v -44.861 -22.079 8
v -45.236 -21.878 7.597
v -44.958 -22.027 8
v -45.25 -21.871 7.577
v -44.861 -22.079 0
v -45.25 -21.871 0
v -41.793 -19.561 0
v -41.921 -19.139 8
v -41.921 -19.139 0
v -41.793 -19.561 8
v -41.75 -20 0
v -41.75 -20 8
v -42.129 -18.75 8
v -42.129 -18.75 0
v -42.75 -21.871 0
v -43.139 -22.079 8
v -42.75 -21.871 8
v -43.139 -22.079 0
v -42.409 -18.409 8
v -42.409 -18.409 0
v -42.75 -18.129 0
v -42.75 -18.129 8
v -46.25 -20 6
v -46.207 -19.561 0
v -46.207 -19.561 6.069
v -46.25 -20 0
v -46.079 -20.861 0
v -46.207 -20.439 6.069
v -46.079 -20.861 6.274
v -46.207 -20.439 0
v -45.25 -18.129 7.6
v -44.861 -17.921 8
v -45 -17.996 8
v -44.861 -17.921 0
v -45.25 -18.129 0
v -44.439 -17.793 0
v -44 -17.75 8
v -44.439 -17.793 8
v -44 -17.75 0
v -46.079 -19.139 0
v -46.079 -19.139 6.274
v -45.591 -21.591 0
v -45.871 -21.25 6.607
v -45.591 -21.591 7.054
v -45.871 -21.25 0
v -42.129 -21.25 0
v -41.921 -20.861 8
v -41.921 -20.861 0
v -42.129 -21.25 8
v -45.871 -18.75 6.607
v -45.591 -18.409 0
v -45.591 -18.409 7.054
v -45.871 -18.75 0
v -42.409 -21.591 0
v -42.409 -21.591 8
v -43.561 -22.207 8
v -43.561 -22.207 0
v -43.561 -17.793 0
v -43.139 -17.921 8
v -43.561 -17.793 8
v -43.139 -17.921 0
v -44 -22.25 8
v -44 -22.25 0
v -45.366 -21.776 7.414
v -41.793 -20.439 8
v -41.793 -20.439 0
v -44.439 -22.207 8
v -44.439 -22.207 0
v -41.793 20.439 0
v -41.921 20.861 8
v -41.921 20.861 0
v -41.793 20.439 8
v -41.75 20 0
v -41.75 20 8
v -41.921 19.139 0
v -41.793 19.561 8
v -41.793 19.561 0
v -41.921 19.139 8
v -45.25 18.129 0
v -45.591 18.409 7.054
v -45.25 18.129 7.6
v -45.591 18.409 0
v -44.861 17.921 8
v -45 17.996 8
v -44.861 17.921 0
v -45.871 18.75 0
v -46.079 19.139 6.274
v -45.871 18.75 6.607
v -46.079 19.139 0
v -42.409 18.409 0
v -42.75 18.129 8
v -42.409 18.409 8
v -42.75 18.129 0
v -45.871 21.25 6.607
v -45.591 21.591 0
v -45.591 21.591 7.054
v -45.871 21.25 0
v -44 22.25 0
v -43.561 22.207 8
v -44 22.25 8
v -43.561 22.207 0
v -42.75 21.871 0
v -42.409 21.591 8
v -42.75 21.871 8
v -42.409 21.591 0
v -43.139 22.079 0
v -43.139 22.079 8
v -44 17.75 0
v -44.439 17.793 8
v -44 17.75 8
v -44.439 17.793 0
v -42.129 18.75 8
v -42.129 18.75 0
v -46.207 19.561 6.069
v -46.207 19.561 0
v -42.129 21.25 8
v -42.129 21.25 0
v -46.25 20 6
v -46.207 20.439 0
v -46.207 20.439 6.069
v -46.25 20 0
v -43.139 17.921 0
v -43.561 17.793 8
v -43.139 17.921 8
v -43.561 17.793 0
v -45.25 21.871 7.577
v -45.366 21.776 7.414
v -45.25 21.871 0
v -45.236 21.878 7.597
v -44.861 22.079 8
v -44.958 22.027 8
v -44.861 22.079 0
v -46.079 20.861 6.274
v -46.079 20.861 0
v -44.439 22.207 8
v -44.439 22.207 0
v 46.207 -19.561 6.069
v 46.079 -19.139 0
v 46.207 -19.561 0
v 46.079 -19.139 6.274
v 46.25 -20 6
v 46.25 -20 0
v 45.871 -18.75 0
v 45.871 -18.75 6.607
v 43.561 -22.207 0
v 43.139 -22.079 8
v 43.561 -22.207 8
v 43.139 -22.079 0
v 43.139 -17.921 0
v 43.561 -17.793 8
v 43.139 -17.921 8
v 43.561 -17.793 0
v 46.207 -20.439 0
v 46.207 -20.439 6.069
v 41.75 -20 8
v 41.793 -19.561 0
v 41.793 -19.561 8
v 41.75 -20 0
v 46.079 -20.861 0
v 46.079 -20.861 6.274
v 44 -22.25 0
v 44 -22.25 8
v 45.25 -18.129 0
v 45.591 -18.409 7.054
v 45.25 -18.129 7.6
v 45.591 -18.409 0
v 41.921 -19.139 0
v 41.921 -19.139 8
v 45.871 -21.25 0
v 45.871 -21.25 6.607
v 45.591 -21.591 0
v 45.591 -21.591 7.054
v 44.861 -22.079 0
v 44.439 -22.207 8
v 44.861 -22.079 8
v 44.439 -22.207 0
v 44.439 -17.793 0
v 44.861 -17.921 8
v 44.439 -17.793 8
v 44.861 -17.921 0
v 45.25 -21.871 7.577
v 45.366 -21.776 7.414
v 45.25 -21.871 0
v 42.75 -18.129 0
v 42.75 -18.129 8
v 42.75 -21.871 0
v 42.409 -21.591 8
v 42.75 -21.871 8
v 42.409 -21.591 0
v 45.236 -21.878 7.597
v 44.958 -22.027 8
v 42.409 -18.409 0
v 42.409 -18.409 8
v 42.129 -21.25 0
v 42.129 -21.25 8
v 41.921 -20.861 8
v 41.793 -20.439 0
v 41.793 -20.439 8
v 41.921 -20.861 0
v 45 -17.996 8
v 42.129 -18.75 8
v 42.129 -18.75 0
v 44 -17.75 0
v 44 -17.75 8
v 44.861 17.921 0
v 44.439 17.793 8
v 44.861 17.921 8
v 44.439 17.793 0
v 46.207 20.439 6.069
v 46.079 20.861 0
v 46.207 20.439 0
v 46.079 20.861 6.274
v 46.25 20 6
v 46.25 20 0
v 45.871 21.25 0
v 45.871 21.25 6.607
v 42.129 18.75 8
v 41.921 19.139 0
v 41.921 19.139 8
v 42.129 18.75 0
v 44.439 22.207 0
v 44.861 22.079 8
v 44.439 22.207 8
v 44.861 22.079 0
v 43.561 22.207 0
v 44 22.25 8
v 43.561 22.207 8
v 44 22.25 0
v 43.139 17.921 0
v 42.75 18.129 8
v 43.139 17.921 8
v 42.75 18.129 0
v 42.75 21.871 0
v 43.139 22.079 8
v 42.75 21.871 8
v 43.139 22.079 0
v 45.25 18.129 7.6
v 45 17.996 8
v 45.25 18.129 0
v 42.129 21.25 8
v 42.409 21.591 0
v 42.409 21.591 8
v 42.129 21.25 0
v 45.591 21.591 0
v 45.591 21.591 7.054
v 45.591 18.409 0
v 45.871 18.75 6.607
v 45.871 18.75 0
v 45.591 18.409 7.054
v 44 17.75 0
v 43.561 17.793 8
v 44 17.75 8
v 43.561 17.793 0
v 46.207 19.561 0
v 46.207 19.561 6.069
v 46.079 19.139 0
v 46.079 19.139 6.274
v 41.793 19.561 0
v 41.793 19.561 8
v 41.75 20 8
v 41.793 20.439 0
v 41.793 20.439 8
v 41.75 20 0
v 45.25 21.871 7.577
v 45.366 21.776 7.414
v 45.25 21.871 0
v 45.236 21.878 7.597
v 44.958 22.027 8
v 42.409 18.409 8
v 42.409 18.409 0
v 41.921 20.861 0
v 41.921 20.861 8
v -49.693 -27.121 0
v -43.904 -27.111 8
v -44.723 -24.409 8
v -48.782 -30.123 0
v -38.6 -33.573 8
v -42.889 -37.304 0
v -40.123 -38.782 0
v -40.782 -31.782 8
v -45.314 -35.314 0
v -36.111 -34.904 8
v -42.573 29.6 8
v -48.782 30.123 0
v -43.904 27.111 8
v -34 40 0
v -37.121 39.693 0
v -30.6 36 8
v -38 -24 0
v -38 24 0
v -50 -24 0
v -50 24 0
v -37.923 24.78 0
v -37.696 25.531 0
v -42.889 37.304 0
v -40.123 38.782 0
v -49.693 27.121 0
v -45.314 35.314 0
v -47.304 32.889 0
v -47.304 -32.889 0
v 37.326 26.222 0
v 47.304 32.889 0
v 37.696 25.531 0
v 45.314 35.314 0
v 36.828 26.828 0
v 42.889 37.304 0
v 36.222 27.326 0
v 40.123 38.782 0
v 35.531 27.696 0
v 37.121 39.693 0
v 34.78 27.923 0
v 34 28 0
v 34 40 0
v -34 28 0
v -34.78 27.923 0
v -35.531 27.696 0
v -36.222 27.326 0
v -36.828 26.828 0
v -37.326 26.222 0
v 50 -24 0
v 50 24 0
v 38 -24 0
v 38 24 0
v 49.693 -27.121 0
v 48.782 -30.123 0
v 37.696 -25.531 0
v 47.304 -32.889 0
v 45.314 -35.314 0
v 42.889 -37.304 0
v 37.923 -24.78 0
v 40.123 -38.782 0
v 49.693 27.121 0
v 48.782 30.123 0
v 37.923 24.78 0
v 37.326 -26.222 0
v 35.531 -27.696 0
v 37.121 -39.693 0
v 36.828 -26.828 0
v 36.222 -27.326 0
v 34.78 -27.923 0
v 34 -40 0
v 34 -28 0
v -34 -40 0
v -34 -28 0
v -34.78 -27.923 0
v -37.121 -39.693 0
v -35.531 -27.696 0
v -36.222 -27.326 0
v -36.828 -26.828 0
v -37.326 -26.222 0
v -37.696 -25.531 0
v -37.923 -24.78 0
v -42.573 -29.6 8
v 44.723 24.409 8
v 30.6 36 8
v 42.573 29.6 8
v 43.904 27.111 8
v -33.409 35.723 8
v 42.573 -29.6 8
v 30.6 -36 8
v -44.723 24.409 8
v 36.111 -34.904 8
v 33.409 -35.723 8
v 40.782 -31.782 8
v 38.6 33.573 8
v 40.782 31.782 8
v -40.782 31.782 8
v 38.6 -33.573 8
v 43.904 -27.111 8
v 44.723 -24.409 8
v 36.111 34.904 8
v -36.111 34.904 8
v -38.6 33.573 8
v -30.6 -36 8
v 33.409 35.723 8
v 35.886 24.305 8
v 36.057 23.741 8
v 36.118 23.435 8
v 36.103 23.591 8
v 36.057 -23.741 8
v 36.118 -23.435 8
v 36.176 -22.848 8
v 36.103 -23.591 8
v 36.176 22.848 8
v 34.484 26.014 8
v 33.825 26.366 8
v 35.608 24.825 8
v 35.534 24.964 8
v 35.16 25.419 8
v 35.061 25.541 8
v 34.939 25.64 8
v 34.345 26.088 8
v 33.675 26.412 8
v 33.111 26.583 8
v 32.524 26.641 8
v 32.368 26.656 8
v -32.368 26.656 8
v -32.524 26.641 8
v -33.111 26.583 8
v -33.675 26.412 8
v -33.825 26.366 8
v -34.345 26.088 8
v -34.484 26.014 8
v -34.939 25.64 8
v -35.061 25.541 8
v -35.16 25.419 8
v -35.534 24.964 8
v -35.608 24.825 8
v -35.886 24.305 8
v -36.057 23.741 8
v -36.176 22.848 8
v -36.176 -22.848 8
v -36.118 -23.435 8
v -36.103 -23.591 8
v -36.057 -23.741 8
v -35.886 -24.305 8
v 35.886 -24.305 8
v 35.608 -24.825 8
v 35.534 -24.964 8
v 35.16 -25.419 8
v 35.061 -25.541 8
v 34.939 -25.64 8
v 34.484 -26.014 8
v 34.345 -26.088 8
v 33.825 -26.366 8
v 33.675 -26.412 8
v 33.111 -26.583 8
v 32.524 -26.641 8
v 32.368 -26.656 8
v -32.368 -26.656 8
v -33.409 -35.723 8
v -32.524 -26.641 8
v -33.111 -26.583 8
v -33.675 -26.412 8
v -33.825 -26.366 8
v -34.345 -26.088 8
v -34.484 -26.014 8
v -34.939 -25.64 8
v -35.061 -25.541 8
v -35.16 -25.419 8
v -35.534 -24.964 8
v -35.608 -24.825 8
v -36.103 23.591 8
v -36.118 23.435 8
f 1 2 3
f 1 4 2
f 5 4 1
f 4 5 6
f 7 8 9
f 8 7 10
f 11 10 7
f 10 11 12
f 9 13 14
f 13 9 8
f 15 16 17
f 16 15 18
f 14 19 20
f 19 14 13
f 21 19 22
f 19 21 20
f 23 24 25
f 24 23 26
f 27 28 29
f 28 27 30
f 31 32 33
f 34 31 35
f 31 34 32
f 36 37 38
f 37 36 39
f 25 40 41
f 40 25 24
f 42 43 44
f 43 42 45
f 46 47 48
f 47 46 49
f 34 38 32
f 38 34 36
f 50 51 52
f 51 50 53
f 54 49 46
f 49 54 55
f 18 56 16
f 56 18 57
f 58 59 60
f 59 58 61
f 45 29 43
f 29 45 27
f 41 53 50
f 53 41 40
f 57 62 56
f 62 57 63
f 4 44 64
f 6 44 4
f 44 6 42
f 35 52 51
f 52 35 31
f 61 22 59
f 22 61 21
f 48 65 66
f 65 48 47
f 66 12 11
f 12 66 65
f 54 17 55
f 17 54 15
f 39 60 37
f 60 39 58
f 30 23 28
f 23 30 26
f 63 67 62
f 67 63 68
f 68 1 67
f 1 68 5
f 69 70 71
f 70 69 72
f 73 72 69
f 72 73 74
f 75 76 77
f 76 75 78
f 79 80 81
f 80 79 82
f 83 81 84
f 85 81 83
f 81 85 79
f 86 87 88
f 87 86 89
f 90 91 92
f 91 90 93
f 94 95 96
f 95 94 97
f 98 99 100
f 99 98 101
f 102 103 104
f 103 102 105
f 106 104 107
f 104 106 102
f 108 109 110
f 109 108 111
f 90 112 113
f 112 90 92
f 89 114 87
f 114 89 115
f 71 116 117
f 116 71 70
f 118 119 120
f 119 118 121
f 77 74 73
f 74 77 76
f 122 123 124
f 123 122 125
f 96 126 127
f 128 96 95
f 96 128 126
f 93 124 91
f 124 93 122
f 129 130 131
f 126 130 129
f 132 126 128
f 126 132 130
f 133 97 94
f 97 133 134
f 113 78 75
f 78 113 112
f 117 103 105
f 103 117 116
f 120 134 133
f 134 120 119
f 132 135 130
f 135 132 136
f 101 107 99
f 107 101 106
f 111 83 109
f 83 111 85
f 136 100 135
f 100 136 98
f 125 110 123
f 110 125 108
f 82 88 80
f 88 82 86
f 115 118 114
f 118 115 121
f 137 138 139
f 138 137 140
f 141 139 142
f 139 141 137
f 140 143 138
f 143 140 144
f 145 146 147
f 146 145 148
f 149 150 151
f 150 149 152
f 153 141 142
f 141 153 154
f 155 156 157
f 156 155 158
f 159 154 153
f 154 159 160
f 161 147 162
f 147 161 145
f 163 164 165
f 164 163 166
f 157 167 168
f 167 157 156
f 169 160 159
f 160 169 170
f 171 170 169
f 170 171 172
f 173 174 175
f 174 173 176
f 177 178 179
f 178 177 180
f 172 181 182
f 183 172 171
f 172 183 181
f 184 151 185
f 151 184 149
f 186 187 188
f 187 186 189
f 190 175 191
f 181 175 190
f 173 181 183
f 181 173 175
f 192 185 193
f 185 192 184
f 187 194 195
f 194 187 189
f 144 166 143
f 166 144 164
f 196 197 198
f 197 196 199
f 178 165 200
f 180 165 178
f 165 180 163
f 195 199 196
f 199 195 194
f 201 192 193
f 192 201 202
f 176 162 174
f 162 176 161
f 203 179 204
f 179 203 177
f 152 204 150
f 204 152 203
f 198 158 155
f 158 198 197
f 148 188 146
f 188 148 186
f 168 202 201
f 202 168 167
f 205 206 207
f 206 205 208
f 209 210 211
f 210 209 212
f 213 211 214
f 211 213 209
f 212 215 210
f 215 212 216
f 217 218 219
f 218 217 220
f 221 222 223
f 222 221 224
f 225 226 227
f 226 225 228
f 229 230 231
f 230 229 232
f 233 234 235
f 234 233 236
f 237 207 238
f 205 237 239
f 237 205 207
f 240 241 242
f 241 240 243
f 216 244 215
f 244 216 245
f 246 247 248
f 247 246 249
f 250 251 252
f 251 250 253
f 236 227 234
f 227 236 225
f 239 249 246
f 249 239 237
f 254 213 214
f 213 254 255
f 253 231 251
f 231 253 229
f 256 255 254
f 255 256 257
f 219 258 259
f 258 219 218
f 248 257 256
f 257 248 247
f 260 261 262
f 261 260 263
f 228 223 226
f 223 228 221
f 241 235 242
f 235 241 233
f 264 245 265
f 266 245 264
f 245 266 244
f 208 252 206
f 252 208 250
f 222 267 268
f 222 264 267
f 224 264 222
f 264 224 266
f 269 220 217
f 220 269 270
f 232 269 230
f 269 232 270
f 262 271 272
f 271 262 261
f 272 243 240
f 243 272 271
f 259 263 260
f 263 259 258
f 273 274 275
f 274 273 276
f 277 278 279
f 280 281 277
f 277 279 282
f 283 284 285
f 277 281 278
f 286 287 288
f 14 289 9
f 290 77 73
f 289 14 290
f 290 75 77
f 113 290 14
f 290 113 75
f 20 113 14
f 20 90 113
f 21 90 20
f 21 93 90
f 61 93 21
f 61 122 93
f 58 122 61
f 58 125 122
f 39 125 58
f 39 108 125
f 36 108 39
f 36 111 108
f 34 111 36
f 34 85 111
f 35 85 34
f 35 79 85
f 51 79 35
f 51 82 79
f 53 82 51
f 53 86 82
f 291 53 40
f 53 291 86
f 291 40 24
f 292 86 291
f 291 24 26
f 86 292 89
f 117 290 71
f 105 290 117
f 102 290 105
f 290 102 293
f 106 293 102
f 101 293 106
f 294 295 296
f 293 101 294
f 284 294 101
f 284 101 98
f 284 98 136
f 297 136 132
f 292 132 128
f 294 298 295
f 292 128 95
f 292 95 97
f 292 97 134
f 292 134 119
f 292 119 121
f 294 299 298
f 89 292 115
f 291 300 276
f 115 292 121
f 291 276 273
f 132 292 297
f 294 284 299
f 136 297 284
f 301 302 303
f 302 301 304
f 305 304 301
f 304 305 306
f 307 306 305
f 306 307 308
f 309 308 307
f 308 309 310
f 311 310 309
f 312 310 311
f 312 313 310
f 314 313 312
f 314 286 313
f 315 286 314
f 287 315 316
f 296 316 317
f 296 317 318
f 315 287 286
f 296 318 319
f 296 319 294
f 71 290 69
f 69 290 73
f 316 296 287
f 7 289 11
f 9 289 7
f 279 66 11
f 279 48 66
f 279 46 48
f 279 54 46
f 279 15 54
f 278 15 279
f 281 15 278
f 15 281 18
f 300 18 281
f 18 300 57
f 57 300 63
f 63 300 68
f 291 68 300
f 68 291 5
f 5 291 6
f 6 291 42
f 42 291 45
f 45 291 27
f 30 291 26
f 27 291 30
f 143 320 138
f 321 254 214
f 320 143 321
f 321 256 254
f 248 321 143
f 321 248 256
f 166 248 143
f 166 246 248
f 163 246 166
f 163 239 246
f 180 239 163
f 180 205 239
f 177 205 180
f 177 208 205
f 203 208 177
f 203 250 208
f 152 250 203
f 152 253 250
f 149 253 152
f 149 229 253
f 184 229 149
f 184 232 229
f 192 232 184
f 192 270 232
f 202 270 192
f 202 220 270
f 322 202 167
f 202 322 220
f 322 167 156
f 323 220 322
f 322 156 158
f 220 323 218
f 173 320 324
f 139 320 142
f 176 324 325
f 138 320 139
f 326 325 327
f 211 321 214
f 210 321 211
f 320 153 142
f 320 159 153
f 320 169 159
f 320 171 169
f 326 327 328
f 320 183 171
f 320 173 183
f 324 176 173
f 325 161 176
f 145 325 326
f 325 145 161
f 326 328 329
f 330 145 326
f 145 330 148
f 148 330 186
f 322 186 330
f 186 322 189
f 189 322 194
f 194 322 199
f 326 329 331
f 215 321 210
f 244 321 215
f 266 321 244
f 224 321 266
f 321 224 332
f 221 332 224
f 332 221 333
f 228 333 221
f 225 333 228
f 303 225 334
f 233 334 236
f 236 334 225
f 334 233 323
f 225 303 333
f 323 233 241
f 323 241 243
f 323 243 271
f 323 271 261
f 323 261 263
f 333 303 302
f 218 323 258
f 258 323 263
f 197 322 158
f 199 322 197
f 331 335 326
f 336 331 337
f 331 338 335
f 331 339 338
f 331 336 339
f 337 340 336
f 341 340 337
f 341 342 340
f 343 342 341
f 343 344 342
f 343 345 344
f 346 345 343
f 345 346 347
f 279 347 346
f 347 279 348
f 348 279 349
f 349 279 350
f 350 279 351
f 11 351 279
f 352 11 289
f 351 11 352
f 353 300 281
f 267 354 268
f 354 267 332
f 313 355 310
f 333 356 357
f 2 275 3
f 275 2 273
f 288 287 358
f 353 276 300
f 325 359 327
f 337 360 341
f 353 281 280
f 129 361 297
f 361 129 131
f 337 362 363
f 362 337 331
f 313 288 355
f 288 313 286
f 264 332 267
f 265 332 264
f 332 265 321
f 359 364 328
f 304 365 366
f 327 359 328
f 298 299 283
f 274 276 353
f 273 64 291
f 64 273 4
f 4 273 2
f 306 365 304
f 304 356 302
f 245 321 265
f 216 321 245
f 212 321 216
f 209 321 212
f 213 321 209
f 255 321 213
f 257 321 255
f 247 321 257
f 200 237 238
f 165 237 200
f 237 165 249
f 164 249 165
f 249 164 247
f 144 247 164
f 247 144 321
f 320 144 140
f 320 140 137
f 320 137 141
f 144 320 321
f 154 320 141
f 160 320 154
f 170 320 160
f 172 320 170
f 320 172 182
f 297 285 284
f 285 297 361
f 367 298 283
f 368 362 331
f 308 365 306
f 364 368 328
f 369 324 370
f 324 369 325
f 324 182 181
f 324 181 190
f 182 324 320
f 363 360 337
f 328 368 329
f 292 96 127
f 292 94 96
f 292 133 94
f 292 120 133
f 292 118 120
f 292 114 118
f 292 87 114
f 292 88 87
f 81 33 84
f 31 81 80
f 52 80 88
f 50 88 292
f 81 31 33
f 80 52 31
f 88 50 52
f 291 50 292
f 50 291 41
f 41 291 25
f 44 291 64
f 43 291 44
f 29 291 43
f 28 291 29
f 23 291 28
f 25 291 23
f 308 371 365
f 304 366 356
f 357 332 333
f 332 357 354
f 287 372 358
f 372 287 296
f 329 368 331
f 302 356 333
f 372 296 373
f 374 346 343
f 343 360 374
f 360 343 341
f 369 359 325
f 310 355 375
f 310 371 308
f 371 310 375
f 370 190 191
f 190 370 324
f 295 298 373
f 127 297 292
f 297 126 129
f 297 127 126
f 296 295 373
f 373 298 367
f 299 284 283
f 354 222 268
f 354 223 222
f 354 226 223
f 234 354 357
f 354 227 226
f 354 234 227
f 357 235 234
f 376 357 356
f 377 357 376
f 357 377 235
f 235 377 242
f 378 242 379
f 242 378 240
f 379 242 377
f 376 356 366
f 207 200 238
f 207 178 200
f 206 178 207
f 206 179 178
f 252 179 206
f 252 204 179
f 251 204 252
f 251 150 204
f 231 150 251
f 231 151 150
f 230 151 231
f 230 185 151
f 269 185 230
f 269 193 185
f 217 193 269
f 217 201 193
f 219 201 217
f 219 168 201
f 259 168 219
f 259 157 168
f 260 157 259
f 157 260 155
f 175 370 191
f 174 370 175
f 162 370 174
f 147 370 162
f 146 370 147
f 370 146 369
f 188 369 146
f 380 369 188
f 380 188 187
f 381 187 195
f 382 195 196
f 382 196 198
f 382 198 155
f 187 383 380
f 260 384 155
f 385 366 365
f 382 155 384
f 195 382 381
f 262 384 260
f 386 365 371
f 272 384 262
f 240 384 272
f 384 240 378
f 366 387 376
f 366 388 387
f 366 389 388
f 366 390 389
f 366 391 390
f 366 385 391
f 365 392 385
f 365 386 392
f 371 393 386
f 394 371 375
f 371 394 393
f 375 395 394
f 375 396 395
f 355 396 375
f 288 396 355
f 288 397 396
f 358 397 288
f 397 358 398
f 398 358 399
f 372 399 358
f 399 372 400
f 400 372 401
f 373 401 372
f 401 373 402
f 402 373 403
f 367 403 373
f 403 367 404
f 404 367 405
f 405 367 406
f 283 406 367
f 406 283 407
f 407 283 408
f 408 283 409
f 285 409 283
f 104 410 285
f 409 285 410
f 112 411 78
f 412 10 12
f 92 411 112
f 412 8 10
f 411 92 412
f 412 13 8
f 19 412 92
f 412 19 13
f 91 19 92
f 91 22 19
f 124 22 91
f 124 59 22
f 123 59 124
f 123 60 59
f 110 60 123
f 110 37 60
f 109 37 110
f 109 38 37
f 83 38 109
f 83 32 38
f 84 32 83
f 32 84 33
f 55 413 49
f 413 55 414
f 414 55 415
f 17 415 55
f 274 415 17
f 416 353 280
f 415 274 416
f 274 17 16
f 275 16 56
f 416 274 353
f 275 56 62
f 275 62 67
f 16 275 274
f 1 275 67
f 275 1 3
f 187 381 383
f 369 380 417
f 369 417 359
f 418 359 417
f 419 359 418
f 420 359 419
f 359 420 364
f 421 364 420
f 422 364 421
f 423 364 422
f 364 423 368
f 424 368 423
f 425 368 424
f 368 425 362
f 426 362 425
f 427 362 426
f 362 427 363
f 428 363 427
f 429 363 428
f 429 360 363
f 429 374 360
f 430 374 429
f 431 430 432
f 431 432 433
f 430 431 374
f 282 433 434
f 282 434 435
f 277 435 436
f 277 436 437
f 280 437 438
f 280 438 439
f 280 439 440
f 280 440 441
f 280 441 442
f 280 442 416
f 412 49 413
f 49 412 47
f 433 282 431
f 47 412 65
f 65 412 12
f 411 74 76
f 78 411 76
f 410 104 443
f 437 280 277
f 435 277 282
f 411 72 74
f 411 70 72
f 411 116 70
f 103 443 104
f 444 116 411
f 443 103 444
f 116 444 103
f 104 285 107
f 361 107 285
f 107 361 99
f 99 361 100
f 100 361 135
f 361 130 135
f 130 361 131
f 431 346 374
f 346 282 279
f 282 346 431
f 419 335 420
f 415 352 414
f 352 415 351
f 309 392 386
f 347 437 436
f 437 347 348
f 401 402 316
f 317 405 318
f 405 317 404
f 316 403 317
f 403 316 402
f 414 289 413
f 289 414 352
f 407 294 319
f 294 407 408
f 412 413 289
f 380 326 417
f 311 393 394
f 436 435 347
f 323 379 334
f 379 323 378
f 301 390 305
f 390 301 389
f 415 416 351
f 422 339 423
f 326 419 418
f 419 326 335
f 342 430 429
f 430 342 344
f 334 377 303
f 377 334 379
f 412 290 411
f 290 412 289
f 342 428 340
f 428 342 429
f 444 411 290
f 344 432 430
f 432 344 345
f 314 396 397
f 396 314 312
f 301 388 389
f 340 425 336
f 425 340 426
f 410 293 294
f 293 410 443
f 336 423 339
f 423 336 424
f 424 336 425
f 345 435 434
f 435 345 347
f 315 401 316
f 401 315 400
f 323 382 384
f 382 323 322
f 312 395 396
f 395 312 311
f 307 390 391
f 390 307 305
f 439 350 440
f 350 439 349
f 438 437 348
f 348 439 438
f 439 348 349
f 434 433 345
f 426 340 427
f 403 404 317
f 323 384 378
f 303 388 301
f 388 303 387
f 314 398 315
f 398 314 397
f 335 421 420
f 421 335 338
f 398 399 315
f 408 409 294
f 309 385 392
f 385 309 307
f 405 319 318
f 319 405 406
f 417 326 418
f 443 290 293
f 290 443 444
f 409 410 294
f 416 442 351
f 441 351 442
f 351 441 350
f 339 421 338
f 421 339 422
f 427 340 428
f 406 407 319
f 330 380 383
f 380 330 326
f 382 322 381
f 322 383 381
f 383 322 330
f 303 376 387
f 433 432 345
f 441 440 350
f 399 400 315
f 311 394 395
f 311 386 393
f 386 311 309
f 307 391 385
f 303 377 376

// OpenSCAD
$fn = 32;

// ----------------------------------------------------------------------
// Display bezel: 100 x 80 mm frame, opening 76x56 mm
// ----------------------------------------------------------------------

// --- parameters (mm) ---
length = 100;             // frame outside length, X
width = 80;               // frame outside width, Y
frame_w = 12;             // frame width
thickness = 8;            // frame thickness
corner_r = 16;            // outside corner radius
chamfer = 0.9;            // outer wall taper
funnel = 0.94;            // inner opening taper
opening_l = 76;           // opening length
opening_w = 56;           // opening width
inner_r = 4;              // opening corner radius
hole_d = 4.5;             // mounting screw clearance
holes_per_side = 2;       // holes per short side
hole_inset = 6;           // hole centre inset from the outside edge

/* rounded-rectangle outlines, generated with loops */
module rounded_ring(l_nom, w_nom, r) {
  hull() {
    for (sx = [-1, 1]) for (sy = [-1, 1])
      translate([sx * (l_nom / 2 - r), sy * (w_nom / 2 - r)]) circle(r = r);
  }
}

difference() {
  /* frame body, drafted so the outer edge is a variable-depth chamfer */
  linear_extrude(height = thickness, scale = chamfer)
    rounded_ring(length, width, corner_r);
  /* viewing opening, drafted the other way for a funnel edge */
  linear_extrude(height = thickness + 2, scale = funnel)
    translate([0, 0, -1]) rounded_ring(opening_l, opening_w, inner_r);
  /* mounting screws through the frame lands */
  for (sx = [-1, 1]) for (i = [1 : holes_per_side])
    translate([sx * (length / 2 - hole_inset),
               (i - (holes_per_side + 1) / 2) * width * 0.5, -1])
      cylinder(h = thickness + 2, d = hole_d);
}
